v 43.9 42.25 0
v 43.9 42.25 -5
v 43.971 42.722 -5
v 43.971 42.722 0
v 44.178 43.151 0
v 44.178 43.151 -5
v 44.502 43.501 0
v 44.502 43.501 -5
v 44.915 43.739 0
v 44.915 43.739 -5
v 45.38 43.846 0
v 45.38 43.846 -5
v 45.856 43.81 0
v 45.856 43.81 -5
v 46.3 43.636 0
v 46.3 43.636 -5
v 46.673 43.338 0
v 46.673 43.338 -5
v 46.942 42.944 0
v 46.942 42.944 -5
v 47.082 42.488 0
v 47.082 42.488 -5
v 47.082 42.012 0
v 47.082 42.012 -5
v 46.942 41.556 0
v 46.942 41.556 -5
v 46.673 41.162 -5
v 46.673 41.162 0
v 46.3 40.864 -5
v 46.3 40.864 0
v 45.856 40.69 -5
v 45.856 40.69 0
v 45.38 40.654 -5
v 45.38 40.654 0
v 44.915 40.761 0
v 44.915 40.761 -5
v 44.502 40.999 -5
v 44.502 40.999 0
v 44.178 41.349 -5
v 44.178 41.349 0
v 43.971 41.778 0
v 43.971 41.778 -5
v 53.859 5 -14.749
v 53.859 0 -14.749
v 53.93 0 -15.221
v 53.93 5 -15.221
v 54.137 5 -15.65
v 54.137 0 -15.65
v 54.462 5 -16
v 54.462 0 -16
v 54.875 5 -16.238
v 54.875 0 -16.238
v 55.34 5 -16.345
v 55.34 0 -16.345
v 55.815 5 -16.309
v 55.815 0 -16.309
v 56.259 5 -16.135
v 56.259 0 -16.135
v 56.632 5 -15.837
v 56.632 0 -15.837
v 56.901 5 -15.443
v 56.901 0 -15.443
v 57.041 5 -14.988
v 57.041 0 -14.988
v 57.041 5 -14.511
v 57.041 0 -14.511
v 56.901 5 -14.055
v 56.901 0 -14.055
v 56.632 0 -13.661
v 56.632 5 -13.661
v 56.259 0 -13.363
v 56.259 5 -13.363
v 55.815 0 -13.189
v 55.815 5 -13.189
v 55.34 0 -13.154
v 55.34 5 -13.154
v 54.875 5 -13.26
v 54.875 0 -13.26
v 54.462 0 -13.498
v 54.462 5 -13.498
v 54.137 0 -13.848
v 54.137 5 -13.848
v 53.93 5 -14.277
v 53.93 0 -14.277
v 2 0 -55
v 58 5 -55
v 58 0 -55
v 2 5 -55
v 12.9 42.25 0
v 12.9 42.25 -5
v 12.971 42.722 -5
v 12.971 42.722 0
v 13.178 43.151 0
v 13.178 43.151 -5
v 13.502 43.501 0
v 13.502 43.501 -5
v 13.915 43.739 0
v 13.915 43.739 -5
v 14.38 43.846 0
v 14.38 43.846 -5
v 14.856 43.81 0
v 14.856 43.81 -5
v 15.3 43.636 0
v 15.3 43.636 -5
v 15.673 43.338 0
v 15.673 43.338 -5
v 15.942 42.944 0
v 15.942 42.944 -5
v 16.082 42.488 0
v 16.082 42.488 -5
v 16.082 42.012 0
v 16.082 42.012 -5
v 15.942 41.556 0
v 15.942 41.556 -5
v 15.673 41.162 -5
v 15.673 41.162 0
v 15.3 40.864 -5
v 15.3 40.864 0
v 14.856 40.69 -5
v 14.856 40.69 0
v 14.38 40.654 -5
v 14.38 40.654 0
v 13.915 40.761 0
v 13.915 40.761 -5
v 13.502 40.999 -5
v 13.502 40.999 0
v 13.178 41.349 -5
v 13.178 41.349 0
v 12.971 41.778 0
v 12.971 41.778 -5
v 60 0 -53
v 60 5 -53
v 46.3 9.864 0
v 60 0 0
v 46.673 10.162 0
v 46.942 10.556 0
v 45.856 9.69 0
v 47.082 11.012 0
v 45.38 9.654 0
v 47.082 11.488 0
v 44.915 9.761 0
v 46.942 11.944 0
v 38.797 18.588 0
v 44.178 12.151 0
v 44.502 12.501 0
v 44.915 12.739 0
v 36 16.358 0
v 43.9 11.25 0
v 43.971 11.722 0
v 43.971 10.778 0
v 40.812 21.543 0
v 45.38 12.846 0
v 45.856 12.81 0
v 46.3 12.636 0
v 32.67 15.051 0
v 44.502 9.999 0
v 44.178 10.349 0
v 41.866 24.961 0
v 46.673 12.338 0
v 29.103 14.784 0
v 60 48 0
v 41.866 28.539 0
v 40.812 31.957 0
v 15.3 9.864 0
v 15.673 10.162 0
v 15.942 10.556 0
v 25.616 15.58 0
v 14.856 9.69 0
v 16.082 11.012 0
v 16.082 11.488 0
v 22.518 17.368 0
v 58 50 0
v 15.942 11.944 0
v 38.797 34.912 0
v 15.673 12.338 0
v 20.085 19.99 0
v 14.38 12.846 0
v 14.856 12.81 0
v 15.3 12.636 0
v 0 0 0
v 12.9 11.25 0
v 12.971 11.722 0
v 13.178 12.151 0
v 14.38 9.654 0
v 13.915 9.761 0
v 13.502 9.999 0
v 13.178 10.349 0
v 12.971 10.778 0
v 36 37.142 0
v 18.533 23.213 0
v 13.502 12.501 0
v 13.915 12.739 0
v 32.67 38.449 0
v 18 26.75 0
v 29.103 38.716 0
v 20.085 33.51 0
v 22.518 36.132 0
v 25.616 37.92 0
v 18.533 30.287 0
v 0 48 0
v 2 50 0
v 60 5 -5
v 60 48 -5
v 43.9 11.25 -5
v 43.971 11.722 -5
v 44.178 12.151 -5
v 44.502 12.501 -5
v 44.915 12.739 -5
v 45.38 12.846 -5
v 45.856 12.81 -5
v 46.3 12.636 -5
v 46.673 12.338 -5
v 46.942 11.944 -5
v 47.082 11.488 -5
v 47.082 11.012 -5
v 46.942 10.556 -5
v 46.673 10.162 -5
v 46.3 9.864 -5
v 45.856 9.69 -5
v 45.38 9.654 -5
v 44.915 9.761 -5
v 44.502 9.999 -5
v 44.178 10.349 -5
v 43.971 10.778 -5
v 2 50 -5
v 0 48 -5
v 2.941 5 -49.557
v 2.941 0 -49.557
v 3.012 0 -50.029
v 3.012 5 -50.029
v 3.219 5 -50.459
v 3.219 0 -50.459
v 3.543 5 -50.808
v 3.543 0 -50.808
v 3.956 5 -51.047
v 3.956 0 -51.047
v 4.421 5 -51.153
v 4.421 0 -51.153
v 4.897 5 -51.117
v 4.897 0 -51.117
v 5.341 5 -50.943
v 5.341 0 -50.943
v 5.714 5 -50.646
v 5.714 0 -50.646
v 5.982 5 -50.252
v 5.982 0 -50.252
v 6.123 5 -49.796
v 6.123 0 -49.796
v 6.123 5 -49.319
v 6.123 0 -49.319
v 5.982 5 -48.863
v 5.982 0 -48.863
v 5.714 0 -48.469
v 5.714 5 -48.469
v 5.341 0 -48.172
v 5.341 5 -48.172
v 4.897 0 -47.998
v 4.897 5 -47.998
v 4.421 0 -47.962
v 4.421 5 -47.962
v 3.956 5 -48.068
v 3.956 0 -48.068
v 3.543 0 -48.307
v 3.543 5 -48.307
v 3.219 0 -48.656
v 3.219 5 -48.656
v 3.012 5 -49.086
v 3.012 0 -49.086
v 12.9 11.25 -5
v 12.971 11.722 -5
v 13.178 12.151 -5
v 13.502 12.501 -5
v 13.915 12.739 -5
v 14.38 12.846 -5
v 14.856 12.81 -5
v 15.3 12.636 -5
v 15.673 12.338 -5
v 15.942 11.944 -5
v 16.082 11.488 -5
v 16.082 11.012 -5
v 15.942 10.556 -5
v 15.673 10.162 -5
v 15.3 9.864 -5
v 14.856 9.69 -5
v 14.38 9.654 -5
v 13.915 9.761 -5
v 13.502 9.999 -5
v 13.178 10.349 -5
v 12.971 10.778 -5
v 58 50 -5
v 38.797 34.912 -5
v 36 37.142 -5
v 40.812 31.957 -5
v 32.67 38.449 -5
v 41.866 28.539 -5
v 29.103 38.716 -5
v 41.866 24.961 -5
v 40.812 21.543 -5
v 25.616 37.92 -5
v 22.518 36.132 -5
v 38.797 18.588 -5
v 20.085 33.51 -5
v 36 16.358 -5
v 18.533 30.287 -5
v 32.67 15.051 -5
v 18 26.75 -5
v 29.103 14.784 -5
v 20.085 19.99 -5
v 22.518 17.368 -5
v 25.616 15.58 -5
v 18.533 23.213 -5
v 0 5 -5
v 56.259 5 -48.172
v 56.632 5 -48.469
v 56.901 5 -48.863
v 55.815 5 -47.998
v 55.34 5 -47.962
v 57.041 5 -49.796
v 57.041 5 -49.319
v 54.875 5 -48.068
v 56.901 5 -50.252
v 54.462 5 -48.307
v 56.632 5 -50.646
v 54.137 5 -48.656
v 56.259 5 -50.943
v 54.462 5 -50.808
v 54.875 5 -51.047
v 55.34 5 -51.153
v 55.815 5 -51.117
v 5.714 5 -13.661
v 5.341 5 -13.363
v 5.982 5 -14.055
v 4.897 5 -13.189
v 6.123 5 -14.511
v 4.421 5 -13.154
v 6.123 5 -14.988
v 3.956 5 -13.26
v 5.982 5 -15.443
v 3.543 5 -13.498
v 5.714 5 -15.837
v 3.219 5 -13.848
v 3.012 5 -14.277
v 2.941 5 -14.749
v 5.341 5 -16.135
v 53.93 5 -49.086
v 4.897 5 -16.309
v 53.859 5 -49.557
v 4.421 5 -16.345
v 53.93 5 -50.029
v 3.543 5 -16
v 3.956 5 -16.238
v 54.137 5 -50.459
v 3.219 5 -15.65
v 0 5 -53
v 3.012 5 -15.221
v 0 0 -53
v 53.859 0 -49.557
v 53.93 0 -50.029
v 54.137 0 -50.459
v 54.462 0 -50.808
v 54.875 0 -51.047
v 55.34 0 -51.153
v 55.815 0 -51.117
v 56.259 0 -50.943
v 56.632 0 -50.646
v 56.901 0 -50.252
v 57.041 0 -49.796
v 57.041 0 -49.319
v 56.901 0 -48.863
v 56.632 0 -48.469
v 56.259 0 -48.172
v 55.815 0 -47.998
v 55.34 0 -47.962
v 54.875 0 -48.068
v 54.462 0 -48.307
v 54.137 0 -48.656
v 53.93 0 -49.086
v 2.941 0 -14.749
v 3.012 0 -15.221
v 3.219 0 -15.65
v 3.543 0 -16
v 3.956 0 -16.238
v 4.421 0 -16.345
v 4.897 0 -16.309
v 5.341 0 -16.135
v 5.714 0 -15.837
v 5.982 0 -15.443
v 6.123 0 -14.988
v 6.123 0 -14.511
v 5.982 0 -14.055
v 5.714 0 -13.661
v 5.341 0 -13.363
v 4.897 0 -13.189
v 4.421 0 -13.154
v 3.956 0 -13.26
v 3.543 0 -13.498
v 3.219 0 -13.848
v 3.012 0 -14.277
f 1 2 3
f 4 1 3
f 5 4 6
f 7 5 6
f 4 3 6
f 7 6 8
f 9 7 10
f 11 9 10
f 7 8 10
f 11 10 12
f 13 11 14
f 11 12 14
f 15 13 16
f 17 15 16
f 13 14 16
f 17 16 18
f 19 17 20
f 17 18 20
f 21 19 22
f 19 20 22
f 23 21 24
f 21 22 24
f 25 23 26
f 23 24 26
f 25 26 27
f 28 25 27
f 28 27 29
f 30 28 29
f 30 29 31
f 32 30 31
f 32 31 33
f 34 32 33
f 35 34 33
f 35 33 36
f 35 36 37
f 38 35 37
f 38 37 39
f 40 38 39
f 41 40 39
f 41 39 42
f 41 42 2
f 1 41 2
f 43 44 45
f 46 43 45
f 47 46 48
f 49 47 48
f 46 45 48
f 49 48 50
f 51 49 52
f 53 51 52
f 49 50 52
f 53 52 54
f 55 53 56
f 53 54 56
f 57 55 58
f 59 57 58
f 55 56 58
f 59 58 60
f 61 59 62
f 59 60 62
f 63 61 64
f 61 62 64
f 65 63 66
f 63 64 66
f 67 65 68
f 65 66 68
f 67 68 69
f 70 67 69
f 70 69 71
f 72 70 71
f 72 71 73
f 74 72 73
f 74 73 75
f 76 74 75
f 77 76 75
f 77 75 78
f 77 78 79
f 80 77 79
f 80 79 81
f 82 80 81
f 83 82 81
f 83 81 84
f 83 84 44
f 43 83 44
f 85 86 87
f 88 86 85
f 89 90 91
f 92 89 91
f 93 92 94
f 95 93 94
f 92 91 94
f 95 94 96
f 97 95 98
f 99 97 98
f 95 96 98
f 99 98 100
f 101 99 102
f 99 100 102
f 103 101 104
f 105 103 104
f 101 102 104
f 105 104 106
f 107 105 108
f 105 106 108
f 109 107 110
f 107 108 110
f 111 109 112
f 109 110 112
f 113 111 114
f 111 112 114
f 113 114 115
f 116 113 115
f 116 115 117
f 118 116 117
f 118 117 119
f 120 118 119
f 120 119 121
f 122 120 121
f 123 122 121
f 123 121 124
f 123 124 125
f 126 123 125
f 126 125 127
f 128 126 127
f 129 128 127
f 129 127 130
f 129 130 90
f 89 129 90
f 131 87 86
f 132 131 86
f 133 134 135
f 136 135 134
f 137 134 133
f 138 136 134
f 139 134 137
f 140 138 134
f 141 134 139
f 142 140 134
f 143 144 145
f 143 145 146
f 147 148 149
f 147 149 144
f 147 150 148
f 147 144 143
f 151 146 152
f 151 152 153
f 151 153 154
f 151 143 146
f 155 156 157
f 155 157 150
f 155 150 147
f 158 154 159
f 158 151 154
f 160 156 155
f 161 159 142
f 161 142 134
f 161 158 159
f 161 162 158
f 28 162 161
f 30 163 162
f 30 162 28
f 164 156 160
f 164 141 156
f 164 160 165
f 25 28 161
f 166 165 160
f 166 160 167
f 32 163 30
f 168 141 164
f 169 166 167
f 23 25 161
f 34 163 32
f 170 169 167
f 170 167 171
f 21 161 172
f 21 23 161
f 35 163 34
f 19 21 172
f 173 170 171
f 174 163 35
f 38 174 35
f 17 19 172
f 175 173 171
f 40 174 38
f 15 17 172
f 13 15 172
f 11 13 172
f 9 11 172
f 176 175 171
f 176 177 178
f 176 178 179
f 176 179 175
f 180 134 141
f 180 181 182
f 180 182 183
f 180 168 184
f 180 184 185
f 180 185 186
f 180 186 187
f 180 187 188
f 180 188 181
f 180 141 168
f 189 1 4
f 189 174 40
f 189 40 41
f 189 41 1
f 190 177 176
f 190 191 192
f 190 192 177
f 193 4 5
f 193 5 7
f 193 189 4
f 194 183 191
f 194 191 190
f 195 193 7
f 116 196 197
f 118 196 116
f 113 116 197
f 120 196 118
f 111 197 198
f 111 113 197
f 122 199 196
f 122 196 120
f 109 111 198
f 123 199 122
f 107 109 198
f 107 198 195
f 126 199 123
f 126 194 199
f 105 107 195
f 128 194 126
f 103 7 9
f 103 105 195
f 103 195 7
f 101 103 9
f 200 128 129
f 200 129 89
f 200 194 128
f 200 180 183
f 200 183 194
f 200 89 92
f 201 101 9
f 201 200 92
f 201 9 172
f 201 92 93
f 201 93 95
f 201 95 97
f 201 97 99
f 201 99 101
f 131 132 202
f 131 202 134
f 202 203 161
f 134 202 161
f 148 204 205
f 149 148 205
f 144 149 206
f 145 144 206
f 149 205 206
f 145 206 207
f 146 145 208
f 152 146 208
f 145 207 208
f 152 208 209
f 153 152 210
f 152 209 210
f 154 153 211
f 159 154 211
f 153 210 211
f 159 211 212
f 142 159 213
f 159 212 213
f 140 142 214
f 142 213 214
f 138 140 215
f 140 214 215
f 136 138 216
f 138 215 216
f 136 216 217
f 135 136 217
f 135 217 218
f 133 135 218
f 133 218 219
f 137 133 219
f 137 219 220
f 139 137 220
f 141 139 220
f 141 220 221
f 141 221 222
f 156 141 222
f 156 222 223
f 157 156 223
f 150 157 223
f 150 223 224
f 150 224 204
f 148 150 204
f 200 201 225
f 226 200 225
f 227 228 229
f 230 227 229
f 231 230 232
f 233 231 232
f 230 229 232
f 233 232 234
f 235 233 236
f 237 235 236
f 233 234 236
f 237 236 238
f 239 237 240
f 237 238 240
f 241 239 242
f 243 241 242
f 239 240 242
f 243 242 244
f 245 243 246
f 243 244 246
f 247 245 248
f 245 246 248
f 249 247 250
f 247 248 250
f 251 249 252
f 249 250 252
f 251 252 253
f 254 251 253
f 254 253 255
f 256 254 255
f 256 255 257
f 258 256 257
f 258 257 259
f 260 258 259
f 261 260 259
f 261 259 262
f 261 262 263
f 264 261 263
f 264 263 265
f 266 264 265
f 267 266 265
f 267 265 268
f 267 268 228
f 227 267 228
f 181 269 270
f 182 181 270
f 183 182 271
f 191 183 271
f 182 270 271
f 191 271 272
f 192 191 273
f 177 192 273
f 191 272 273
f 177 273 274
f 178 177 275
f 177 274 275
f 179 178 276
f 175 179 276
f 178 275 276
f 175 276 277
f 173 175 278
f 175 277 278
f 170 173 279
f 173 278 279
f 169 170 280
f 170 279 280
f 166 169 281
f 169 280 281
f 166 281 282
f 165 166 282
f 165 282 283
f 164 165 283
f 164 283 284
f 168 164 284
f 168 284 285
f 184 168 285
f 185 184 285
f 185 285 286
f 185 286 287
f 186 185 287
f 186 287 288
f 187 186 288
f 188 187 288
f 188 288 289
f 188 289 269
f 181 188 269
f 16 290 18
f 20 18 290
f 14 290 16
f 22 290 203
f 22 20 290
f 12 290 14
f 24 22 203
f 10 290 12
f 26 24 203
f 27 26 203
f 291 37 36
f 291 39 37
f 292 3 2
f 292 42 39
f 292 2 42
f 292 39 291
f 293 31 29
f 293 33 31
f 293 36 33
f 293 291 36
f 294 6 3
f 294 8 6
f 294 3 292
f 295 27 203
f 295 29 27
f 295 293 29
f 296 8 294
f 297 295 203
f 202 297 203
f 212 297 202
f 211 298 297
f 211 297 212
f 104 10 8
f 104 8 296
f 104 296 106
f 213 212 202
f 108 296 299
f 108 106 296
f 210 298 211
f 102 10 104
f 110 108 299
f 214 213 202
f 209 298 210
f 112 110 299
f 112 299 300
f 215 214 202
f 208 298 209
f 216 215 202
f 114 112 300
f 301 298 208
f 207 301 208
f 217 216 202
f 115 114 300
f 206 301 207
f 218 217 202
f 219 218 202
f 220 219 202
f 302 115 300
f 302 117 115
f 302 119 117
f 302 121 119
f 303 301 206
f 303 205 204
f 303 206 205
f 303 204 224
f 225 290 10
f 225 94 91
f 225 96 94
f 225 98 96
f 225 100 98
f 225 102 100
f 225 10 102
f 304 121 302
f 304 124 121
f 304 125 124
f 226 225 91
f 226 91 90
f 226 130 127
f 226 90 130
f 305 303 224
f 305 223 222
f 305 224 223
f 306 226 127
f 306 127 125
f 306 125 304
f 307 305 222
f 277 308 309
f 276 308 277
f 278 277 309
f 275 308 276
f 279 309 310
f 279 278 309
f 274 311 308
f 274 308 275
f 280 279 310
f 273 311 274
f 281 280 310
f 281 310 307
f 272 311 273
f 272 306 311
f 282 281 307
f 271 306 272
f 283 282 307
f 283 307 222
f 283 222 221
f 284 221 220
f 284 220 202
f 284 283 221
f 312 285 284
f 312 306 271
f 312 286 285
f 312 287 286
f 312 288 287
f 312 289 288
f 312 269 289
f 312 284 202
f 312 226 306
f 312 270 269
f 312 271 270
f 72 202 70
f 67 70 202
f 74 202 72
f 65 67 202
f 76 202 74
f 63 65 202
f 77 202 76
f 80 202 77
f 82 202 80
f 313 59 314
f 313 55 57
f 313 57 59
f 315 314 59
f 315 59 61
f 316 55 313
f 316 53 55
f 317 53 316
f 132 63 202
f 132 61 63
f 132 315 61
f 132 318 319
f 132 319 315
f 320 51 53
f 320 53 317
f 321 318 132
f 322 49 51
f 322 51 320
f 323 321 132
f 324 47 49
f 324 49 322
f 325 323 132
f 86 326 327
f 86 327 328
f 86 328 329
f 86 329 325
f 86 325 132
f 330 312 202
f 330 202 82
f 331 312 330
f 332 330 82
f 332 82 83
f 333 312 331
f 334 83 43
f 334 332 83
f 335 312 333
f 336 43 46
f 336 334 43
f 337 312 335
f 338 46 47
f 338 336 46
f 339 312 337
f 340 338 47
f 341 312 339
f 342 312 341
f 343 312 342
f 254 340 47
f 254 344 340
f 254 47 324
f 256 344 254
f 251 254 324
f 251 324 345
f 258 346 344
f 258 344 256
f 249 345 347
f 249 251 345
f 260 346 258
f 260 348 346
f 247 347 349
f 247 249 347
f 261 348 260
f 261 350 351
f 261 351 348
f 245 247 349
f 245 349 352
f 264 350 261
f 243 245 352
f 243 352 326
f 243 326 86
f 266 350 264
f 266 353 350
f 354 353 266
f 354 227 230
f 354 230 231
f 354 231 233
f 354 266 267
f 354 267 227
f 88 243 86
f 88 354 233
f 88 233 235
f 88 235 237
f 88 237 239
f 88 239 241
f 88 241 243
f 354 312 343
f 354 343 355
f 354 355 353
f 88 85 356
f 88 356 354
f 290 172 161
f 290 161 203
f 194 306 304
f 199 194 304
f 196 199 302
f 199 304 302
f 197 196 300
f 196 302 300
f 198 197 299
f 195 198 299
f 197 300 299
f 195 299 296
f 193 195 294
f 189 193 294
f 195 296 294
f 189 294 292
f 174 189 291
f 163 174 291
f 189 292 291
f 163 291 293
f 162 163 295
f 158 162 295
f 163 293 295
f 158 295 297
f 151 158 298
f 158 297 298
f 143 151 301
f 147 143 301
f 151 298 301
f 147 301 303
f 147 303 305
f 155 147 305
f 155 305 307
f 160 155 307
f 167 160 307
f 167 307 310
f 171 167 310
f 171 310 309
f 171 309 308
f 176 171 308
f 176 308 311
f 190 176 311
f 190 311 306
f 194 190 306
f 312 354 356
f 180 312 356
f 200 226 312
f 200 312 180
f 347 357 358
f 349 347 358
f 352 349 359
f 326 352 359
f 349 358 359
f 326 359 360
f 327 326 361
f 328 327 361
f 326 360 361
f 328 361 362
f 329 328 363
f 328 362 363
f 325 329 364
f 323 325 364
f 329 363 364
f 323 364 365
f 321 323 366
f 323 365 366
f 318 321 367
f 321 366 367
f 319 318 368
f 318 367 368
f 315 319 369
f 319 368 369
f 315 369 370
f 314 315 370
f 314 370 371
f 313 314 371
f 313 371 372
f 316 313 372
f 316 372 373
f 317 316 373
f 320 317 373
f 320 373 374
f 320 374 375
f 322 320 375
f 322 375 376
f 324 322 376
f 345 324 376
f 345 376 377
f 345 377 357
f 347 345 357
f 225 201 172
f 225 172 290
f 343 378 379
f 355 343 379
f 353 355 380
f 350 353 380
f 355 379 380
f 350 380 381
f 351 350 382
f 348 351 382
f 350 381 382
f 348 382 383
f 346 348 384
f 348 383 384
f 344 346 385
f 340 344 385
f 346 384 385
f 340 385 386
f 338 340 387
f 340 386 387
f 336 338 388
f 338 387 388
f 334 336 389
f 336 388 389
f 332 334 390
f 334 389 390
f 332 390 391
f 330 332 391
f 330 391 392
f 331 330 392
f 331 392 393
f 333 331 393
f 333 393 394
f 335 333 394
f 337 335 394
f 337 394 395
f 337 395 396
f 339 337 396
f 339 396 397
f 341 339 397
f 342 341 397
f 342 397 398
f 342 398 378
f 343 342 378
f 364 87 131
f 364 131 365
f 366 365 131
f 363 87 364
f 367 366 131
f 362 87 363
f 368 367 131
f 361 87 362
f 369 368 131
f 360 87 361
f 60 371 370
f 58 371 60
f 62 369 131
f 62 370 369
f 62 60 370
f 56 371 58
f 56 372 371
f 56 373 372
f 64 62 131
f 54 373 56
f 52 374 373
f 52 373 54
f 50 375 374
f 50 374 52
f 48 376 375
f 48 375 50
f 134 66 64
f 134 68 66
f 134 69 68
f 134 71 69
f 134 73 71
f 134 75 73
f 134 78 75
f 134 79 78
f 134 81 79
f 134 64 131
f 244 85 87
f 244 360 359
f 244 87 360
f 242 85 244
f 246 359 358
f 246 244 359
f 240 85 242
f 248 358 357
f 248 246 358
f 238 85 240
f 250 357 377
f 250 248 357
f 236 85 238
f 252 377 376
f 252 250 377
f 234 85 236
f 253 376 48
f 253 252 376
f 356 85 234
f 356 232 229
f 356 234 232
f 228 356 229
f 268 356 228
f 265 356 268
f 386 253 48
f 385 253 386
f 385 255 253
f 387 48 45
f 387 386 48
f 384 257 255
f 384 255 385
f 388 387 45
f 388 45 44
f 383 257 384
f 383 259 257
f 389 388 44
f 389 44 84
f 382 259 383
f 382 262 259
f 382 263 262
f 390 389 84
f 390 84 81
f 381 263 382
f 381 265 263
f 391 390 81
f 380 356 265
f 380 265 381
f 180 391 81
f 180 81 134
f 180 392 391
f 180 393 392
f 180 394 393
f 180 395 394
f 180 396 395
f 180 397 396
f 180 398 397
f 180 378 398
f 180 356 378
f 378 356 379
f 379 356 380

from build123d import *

# Parameters (mm, degrees)
EXTRUDE_1_DEPTH     = 60
HOLE_WIZARD_2_D     = 24
HOLE_WIZARD_3_D     = 3.2
HOLE_WIZARD_4_D     = 3.2
SKETCH_14_W         = 60
SKETCH_14_H         = 5
CUT_EXTRUDE_1_DEPTH = 5
CHAMFER_1_SIZE      = 2


with BuildPart() as part:
    # 草图1 → 凸台-拉伸1 (new body)
    with BuildSketch(Plane(origin=(0, 0, 0), x_dir=(0, 0, -1), z_dir=(1, 0, 0))):
        Polygon((0, 0), (0, 50), (5, 50), (5, 5), (60, 5), (60, 0), align=None)
    extrude(amount=EXTRUDE_1_DEPTH)

    # 孔2 (through all)
    with Locations(Plane.XY):
        with Locations((30, 26.75)):
            Hole(HOLE_WIZARD_2_D / 2)

    # 孔3 (through all)
    with Locations(Plane.XY):
        with Locations((14.5, 42.25), (45.5, 42.25), (45.5, 11.25), (14.5, 11.25)):
            Hole(HOLE_WIZARD_3_D / 2)

    # 孔4 (through all)
    with Locations(Plane(origin=(0, 5, 0), x_dir=(1, 0, 0), z_dir=(0, 1, 0))):
        with Locations((55.459259259, 14.749042146), (55.459259259, 49.557471264), (4.540740741, 14.749042146), (4.540740741, 49.557471264)):
            Hole(HOLE_WIZARD_4_D / 2)

    # 草图14 → 切除-拉伸1 (cut)
    with BuildSketch(Plane(origin=(0, 0, -60), x_dir=(-1, 0, 0), z_dir=(0, 0, -1))):
        with Locations((-30, 2.5)):
            Rectangle(SKETCH_14_W, SKETCH_14_H)
    extrude(amount=-CUT_EXTRUDE_1_DEPTH, mode=Mode.SUBTRACT)

    # 倒角1
    chamfer_1_edges = [part.edges().sort_by_distance(p)[0] for p in [
        (0, 2.5, -55),
        (60, 50, -2.5),
        (0, 50, -2.5),
        (60, 2.5, -55),
    ]]
    chamfer(chamfer_1_edges, length=CHAMFER_1_SIZE)


solid = part.part
